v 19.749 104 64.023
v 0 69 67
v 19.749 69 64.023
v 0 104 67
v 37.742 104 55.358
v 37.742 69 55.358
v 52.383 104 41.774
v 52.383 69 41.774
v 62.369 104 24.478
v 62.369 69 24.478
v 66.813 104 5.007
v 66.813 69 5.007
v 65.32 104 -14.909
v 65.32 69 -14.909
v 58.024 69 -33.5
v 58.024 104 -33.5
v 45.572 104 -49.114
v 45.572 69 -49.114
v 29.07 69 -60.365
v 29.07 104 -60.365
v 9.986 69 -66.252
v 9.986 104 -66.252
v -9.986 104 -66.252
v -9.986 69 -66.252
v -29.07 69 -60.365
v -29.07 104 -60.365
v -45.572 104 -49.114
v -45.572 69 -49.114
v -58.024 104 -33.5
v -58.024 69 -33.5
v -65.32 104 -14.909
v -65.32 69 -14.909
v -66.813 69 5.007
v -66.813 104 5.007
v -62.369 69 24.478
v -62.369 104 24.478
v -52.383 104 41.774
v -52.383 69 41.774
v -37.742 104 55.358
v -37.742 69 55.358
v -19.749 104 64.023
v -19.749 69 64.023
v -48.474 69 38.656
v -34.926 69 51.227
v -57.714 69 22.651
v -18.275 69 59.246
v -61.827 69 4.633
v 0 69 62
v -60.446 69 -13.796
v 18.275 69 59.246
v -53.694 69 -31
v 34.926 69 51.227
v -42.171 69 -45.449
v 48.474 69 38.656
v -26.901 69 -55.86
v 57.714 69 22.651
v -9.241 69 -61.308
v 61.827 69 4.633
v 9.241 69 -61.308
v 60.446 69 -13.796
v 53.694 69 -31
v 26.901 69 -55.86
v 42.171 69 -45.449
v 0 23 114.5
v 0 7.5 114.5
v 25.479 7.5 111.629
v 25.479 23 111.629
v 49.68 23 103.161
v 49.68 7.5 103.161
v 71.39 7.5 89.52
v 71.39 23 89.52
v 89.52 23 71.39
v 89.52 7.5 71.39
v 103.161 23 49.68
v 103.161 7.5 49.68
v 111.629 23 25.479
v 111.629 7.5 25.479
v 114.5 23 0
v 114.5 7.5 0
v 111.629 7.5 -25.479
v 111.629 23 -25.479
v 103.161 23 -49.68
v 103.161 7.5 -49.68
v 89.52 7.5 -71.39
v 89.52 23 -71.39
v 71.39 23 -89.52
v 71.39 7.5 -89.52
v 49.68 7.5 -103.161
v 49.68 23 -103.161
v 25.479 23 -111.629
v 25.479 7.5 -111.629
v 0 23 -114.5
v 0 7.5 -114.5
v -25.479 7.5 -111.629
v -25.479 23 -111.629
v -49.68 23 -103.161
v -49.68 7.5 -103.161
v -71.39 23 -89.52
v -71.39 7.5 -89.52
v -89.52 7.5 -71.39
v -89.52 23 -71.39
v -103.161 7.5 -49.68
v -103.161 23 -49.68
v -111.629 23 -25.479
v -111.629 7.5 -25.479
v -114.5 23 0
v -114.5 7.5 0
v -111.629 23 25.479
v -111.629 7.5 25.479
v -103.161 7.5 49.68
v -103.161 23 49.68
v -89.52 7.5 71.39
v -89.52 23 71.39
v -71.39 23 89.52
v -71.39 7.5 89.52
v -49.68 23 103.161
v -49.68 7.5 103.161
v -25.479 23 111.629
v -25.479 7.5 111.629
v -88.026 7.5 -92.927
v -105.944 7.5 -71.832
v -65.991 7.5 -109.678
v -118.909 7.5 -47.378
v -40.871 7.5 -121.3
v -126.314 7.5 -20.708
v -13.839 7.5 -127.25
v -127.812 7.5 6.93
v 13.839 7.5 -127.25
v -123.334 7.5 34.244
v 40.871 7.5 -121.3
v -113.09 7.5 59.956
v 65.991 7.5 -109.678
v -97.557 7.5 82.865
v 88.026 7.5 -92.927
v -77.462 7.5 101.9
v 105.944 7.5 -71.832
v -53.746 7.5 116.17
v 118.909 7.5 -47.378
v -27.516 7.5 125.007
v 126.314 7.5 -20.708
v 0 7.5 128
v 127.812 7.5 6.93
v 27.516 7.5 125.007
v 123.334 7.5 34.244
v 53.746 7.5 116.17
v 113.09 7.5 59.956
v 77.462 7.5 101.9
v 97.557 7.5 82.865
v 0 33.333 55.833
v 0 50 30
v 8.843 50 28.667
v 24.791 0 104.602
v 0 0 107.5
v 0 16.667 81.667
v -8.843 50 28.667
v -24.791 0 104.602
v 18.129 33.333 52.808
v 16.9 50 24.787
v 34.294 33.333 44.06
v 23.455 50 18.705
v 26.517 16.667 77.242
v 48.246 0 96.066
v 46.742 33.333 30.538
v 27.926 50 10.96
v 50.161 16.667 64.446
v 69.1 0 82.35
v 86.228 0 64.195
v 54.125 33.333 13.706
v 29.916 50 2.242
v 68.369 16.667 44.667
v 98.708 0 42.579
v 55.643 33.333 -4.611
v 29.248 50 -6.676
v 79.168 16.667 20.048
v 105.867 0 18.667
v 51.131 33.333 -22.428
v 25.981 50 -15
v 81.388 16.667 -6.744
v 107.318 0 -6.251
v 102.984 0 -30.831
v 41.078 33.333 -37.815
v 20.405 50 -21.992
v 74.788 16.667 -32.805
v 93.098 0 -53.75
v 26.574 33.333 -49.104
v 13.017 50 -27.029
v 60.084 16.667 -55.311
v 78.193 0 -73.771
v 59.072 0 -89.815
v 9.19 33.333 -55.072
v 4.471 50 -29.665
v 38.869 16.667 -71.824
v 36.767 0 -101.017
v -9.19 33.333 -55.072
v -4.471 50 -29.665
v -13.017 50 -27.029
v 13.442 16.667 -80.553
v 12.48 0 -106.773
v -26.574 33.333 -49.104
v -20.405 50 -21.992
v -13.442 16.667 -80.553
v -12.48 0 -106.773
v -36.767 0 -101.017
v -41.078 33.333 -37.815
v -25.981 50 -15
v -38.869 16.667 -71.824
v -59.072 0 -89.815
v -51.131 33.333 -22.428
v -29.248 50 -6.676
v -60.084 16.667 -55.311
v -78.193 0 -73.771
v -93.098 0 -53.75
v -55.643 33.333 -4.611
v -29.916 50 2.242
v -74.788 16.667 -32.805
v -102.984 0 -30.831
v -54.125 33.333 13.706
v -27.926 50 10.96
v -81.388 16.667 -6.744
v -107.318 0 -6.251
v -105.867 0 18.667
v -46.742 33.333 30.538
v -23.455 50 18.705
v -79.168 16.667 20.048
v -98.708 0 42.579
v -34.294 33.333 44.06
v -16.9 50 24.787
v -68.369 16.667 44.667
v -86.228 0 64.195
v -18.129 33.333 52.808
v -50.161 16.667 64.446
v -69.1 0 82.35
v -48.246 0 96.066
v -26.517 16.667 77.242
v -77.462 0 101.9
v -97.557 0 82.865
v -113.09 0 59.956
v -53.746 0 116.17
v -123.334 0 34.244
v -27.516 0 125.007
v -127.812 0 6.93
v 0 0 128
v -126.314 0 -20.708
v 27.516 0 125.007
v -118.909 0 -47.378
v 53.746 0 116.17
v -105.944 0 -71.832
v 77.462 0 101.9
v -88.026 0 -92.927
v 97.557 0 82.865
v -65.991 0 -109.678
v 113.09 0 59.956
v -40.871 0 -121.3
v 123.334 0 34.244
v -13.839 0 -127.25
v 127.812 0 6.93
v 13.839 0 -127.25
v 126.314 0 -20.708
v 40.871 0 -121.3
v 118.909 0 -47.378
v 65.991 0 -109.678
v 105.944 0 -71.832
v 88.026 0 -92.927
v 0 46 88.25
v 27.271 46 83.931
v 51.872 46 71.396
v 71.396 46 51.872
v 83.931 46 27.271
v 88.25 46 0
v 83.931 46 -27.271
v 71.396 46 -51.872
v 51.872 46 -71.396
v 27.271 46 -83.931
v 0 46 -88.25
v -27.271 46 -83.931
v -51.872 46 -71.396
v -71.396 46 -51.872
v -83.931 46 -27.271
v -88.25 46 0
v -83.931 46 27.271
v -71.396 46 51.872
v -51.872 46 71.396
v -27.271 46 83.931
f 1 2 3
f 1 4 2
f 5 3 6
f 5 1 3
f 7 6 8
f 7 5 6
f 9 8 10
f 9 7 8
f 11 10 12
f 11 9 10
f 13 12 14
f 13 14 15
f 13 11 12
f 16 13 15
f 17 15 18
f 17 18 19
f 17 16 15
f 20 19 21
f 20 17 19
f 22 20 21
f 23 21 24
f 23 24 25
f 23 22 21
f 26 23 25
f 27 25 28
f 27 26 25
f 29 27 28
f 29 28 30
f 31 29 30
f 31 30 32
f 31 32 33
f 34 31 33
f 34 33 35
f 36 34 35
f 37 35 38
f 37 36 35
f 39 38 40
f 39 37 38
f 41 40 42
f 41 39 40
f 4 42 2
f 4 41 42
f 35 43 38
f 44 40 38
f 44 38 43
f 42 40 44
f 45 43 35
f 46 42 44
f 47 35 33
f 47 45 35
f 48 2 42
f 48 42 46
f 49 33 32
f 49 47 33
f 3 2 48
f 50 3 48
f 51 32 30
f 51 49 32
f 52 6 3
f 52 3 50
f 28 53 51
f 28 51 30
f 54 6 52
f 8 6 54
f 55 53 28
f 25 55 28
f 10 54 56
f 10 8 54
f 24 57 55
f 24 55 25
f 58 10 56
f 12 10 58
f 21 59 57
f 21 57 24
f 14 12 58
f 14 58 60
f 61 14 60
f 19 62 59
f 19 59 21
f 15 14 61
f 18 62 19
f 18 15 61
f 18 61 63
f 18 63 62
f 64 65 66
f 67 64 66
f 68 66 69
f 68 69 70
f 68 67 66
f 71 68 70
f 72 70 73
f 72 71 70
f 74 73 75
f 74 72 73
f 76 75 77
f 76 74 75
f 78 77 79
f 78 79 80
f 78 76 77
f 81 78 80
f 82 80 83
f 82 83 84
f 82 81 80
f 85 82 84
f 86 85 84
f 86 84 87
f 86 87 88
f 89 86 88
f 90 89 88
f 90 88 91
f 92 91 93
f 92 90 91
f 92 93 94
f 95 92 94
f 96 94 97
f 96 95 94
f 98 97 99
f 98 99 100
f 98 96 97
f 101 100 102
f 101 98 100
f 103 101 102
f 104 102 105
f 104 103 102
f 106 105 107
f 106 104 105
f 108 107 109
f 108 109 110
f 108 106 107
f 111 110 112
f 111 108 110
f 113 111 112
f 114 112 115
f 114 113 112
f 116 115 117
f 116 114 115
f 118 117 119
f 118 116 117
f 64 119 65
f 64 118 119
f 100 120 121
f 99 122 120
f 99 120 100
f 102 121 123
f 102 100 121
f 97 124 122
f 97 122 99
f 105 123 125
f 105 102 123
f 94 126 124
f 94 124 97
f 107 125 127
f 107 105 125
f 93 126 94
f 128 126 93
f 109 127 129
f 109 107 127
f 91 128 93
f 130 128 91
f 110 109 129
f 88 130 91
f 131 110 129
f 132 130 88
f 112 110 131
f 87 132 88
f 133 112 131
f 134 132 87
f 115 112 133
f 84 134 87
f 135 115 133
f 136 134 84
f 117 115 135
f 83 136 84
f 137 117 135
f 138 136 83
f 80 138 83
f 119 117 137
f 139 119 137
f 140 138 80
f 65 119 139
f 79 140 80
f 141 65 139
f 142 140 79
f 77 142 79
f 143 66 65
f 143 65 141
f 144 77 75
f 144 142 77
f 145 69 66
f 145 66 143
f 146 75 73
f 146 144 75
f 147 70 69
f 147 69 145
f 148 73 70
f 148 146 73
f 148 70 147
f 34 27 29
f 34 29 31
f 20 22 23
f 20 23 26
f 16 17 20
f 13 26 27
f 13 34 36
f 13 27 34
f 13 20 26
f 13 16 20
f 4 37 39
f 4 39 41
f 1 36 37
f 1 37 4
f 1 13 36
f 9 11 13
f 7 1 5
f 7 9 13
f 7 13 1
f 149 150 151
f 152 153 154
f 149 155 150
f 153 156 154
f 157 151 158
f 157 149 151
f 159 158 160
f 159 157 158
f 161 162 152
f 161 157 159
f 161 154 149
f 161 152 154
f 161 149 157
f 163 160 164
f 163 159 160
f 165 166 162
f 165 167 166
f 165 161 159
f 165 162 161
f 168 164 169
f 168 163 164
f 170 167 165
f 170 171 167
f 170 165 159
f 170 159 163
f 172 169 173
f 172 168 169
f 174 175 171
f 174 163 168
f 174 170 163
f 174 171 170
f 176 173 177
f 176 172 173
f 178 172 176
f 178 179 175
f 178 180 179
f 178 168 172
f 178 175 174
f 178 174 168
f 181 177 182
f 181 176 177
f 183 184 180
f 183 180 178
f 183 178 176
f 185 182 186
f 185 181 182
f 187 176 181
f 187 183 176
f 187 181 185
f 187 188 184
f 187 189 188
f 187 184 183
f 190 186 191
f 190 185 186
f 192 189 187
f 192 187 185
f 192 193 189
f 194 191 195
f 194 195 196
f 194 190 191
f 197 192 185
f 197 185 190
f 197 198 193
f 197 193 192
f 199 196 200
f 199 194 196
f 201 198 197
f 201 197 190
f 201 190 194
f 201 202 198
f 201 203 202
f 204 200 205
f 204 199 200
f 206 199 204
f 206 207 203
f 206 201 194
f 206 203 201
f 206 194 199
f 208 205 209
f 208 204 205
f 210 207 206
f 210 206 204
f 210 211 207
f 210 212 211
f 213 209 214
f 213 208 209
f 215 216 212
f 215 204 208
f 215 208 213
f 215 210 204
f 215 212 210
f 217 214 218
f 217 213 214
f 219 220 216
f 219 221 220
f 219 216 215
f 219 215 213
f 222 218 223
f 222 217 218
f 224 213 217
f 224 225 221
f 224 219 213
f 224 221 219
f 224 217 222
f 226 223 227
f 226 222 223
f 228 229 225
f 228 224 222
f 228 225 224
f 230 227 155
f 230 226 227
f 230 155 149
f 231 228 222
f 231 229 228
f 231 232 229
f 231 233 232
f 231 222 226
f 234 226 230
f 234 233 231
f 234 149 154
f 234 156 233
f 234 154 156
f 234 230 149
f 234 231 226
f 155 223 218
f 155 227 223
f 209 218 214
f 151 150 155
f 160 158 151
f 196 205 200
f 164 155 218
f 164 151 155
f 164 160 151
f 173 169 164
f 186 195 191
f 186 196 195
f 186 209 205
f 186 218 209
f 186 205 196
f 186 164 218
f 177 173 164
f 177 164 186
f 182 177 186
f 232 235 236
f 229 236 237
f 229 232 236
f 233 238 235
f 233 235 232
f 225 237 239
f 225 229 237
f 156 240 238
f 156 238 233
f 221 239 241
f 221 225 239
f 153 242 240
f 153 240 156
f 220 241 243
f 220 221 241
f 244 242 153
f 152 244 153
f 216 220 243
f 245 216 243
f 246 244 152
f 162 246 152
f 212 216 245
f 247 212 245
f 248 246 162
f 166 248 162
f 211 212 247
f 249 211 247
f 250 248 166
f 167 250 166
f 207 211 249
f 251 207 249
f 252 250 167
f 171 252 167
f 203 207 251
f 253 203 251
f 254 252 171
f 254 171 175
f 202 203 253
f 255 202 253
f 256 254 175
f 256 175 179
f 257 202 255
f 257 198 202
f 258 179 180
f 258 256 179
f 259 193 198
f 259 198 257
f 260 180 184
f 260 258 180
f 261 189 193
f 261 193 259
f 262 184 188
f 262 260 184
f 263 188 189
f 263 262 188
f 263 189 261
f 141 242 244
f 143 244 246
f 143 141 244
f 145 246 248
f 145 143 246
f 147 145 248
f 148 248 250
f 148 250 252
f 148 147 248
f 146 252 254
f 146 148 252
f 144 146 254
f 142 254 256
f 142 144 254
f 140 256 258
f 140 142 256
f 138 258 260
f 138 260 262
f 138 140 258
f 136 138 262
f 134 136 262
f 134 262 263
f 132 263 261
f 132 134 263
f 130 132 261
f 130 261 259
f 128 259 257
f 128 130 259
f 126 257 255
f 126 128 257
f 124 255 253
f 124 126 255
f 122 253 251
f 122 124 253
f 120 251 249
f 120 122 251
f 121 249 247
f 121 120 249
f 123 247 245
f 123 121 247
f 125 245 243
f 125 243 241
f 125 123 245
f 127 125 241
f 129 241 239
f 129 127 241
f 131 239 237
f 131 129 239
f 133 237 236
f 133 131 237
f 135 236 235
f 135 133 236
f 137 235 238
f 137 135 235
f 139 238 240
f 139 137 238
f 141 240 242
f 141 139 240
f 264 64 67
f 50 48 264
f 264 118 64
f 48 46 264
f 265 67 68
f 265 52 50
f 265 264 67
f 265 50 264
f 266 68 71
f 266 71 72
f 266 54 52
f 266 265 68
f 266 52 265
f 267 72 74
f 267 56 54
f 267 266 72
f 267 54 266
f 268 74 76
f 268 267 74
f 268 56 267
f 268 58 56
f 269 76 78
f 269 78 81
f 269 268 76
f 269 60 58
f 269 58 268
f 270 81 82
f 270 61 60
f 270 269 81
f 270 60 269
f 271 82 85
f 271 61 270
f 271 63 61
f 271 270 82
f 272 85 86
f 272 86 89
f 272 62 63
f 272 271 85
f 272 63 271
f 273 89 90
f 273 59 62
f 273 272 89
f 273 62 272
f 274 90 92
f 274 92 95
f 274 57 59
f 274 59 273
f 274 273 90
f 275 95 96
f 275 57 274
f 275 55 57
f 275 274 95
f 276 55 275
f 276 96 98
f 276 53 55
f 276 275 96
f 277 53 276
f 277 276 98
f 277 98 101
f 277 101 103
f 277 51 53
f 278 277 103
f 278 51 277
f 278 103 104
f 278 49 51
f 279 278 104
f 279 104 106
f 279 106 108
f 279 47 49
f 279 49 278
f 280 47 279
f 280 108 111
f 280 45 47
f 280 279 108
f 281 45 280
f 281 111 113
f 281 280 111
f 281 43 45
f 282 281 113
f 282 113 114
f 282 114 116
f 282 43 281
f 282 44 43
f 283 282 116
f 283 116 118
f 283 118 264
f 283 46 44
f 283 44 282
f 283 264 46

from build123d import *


with BuildPart() as part:
    # Эскиз1 → Повернуть1 (revolve)
    with BuildSketch(Plane(origin=(0, 0, 0), x_dir=(0, 0, -1), z_dir=(1, 0, 0))):
        Polygon((0, 104), (0, 50), (-30, 50), (-107.5, 0), (-128, 0), (-128, 7.5), (-114.5, 7.5), (-114.5, 23), (-62, 69), (-67, 69), (-67, 104), align=None)
    revolve(axis=Axis((0, 0, 0), (0, 1, 0)))


solid = part.part
